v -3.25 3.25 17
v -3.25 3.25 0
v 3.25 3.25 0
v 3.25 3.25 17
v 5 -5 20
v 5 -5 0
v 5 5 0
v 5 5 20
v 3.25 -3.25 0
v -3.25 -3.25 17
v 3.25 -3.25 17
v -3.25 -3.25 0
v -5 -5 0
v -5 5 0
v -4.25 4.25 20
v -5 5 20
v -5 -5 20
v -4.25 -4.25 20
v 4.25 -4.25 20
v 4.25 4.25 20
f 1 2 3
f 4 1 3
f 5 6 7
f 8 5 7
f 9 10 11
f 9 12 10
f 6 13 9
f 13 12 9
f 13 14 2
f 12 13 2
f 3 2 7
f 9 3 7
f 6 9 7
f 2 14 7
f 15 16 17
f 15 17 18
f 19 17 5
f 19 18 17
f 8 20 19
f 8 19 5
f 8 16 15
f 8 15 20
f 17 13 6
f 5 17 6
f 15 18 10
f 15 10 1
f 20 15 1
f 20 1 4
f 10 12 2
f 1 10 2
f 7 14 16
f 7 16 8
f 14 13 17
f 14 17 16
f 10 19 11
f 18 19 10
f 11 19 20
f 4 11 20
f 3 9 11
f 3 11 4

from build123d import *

# Parameters (mm, degrees)
F0_W     = 10
F0_H     = 10
F0_W_2   = 7.5
F0_H_2   = 7.5
F0_W_3   = 6.5
F0_H_3   = 6.5
F1_DEPTH = 20
F2_SIZE2 = 1
F2_SIZE  = 3
F3_SIZE2 = 1
F3_SIZE  = 3
F4_SIZE2 = 1
F4_SIZE  = 3
F5_SIZE2 = 1
F5_SIZE  = 3


with BuildPart() as f1:
    # F0 (on Top) → F1 (new body)
    with BuildSketch(Plane.XY):
        Rectangle(F0_W, F0_H)
        Rectangle(F0_W_2, F0_H_2, mode=Mode.SUBTRACT)
        Rectangle(F0_W_2, F0_H_2)
        Rectangle(F0_W_3, F0_H_3, mode=Mode.SUBTRACT)
    extrude(amount=F1_DEPTH)

    # F2
    f2_edges = [f1.edges().sort_by_distance(p)[0] for p in [
        (-3.25, 0, 20),
    ]]
    f2_side = f1.faces().sort_by_distance((-3.25, 0, 10))[0]
    chamfer(f2_edges, length=F2_SIZE, length2=F2_SIZE2, reference=f2_side)

    # F3
    f3_edges = [f1.edges().sort_by_distance(p)[0] for p in [
        (0, 3.25, 20),
    ]]
    f3_side = f1.faces().sort_by_distance((-0.040875, 3.25, 10.102662))[0]
    chamfer(f3_edges, length=F3_SIZE, length2=F3_SIZE2, reference=f3_side)

    # F4
    f4_edges = [f1.edges().sort_by_distance(p)[0] for p in [
        (3.25, 0, 20),
    ]]
    f4_side = f1.faces().sort_by_distance((3.25, 0.040875, 10.102662))[0]
    chamfer(f4_edges, length=F4_SIZE, length2=F4_SIZE2, reference=f4_side)

    # F5
    f5_edges = [f1.edges().sort_by_distance(p)[0] for p in [
        (0, -3.25, 20),
    ]]
    f5_side = f1.faces().sort_by_distance((0, -3.25, 10.203008))[0]
    chamfer(f5_edges, length=F5_SIZE, length2=F5_SIZE2, reference=f5_side)


solid = f1.part
